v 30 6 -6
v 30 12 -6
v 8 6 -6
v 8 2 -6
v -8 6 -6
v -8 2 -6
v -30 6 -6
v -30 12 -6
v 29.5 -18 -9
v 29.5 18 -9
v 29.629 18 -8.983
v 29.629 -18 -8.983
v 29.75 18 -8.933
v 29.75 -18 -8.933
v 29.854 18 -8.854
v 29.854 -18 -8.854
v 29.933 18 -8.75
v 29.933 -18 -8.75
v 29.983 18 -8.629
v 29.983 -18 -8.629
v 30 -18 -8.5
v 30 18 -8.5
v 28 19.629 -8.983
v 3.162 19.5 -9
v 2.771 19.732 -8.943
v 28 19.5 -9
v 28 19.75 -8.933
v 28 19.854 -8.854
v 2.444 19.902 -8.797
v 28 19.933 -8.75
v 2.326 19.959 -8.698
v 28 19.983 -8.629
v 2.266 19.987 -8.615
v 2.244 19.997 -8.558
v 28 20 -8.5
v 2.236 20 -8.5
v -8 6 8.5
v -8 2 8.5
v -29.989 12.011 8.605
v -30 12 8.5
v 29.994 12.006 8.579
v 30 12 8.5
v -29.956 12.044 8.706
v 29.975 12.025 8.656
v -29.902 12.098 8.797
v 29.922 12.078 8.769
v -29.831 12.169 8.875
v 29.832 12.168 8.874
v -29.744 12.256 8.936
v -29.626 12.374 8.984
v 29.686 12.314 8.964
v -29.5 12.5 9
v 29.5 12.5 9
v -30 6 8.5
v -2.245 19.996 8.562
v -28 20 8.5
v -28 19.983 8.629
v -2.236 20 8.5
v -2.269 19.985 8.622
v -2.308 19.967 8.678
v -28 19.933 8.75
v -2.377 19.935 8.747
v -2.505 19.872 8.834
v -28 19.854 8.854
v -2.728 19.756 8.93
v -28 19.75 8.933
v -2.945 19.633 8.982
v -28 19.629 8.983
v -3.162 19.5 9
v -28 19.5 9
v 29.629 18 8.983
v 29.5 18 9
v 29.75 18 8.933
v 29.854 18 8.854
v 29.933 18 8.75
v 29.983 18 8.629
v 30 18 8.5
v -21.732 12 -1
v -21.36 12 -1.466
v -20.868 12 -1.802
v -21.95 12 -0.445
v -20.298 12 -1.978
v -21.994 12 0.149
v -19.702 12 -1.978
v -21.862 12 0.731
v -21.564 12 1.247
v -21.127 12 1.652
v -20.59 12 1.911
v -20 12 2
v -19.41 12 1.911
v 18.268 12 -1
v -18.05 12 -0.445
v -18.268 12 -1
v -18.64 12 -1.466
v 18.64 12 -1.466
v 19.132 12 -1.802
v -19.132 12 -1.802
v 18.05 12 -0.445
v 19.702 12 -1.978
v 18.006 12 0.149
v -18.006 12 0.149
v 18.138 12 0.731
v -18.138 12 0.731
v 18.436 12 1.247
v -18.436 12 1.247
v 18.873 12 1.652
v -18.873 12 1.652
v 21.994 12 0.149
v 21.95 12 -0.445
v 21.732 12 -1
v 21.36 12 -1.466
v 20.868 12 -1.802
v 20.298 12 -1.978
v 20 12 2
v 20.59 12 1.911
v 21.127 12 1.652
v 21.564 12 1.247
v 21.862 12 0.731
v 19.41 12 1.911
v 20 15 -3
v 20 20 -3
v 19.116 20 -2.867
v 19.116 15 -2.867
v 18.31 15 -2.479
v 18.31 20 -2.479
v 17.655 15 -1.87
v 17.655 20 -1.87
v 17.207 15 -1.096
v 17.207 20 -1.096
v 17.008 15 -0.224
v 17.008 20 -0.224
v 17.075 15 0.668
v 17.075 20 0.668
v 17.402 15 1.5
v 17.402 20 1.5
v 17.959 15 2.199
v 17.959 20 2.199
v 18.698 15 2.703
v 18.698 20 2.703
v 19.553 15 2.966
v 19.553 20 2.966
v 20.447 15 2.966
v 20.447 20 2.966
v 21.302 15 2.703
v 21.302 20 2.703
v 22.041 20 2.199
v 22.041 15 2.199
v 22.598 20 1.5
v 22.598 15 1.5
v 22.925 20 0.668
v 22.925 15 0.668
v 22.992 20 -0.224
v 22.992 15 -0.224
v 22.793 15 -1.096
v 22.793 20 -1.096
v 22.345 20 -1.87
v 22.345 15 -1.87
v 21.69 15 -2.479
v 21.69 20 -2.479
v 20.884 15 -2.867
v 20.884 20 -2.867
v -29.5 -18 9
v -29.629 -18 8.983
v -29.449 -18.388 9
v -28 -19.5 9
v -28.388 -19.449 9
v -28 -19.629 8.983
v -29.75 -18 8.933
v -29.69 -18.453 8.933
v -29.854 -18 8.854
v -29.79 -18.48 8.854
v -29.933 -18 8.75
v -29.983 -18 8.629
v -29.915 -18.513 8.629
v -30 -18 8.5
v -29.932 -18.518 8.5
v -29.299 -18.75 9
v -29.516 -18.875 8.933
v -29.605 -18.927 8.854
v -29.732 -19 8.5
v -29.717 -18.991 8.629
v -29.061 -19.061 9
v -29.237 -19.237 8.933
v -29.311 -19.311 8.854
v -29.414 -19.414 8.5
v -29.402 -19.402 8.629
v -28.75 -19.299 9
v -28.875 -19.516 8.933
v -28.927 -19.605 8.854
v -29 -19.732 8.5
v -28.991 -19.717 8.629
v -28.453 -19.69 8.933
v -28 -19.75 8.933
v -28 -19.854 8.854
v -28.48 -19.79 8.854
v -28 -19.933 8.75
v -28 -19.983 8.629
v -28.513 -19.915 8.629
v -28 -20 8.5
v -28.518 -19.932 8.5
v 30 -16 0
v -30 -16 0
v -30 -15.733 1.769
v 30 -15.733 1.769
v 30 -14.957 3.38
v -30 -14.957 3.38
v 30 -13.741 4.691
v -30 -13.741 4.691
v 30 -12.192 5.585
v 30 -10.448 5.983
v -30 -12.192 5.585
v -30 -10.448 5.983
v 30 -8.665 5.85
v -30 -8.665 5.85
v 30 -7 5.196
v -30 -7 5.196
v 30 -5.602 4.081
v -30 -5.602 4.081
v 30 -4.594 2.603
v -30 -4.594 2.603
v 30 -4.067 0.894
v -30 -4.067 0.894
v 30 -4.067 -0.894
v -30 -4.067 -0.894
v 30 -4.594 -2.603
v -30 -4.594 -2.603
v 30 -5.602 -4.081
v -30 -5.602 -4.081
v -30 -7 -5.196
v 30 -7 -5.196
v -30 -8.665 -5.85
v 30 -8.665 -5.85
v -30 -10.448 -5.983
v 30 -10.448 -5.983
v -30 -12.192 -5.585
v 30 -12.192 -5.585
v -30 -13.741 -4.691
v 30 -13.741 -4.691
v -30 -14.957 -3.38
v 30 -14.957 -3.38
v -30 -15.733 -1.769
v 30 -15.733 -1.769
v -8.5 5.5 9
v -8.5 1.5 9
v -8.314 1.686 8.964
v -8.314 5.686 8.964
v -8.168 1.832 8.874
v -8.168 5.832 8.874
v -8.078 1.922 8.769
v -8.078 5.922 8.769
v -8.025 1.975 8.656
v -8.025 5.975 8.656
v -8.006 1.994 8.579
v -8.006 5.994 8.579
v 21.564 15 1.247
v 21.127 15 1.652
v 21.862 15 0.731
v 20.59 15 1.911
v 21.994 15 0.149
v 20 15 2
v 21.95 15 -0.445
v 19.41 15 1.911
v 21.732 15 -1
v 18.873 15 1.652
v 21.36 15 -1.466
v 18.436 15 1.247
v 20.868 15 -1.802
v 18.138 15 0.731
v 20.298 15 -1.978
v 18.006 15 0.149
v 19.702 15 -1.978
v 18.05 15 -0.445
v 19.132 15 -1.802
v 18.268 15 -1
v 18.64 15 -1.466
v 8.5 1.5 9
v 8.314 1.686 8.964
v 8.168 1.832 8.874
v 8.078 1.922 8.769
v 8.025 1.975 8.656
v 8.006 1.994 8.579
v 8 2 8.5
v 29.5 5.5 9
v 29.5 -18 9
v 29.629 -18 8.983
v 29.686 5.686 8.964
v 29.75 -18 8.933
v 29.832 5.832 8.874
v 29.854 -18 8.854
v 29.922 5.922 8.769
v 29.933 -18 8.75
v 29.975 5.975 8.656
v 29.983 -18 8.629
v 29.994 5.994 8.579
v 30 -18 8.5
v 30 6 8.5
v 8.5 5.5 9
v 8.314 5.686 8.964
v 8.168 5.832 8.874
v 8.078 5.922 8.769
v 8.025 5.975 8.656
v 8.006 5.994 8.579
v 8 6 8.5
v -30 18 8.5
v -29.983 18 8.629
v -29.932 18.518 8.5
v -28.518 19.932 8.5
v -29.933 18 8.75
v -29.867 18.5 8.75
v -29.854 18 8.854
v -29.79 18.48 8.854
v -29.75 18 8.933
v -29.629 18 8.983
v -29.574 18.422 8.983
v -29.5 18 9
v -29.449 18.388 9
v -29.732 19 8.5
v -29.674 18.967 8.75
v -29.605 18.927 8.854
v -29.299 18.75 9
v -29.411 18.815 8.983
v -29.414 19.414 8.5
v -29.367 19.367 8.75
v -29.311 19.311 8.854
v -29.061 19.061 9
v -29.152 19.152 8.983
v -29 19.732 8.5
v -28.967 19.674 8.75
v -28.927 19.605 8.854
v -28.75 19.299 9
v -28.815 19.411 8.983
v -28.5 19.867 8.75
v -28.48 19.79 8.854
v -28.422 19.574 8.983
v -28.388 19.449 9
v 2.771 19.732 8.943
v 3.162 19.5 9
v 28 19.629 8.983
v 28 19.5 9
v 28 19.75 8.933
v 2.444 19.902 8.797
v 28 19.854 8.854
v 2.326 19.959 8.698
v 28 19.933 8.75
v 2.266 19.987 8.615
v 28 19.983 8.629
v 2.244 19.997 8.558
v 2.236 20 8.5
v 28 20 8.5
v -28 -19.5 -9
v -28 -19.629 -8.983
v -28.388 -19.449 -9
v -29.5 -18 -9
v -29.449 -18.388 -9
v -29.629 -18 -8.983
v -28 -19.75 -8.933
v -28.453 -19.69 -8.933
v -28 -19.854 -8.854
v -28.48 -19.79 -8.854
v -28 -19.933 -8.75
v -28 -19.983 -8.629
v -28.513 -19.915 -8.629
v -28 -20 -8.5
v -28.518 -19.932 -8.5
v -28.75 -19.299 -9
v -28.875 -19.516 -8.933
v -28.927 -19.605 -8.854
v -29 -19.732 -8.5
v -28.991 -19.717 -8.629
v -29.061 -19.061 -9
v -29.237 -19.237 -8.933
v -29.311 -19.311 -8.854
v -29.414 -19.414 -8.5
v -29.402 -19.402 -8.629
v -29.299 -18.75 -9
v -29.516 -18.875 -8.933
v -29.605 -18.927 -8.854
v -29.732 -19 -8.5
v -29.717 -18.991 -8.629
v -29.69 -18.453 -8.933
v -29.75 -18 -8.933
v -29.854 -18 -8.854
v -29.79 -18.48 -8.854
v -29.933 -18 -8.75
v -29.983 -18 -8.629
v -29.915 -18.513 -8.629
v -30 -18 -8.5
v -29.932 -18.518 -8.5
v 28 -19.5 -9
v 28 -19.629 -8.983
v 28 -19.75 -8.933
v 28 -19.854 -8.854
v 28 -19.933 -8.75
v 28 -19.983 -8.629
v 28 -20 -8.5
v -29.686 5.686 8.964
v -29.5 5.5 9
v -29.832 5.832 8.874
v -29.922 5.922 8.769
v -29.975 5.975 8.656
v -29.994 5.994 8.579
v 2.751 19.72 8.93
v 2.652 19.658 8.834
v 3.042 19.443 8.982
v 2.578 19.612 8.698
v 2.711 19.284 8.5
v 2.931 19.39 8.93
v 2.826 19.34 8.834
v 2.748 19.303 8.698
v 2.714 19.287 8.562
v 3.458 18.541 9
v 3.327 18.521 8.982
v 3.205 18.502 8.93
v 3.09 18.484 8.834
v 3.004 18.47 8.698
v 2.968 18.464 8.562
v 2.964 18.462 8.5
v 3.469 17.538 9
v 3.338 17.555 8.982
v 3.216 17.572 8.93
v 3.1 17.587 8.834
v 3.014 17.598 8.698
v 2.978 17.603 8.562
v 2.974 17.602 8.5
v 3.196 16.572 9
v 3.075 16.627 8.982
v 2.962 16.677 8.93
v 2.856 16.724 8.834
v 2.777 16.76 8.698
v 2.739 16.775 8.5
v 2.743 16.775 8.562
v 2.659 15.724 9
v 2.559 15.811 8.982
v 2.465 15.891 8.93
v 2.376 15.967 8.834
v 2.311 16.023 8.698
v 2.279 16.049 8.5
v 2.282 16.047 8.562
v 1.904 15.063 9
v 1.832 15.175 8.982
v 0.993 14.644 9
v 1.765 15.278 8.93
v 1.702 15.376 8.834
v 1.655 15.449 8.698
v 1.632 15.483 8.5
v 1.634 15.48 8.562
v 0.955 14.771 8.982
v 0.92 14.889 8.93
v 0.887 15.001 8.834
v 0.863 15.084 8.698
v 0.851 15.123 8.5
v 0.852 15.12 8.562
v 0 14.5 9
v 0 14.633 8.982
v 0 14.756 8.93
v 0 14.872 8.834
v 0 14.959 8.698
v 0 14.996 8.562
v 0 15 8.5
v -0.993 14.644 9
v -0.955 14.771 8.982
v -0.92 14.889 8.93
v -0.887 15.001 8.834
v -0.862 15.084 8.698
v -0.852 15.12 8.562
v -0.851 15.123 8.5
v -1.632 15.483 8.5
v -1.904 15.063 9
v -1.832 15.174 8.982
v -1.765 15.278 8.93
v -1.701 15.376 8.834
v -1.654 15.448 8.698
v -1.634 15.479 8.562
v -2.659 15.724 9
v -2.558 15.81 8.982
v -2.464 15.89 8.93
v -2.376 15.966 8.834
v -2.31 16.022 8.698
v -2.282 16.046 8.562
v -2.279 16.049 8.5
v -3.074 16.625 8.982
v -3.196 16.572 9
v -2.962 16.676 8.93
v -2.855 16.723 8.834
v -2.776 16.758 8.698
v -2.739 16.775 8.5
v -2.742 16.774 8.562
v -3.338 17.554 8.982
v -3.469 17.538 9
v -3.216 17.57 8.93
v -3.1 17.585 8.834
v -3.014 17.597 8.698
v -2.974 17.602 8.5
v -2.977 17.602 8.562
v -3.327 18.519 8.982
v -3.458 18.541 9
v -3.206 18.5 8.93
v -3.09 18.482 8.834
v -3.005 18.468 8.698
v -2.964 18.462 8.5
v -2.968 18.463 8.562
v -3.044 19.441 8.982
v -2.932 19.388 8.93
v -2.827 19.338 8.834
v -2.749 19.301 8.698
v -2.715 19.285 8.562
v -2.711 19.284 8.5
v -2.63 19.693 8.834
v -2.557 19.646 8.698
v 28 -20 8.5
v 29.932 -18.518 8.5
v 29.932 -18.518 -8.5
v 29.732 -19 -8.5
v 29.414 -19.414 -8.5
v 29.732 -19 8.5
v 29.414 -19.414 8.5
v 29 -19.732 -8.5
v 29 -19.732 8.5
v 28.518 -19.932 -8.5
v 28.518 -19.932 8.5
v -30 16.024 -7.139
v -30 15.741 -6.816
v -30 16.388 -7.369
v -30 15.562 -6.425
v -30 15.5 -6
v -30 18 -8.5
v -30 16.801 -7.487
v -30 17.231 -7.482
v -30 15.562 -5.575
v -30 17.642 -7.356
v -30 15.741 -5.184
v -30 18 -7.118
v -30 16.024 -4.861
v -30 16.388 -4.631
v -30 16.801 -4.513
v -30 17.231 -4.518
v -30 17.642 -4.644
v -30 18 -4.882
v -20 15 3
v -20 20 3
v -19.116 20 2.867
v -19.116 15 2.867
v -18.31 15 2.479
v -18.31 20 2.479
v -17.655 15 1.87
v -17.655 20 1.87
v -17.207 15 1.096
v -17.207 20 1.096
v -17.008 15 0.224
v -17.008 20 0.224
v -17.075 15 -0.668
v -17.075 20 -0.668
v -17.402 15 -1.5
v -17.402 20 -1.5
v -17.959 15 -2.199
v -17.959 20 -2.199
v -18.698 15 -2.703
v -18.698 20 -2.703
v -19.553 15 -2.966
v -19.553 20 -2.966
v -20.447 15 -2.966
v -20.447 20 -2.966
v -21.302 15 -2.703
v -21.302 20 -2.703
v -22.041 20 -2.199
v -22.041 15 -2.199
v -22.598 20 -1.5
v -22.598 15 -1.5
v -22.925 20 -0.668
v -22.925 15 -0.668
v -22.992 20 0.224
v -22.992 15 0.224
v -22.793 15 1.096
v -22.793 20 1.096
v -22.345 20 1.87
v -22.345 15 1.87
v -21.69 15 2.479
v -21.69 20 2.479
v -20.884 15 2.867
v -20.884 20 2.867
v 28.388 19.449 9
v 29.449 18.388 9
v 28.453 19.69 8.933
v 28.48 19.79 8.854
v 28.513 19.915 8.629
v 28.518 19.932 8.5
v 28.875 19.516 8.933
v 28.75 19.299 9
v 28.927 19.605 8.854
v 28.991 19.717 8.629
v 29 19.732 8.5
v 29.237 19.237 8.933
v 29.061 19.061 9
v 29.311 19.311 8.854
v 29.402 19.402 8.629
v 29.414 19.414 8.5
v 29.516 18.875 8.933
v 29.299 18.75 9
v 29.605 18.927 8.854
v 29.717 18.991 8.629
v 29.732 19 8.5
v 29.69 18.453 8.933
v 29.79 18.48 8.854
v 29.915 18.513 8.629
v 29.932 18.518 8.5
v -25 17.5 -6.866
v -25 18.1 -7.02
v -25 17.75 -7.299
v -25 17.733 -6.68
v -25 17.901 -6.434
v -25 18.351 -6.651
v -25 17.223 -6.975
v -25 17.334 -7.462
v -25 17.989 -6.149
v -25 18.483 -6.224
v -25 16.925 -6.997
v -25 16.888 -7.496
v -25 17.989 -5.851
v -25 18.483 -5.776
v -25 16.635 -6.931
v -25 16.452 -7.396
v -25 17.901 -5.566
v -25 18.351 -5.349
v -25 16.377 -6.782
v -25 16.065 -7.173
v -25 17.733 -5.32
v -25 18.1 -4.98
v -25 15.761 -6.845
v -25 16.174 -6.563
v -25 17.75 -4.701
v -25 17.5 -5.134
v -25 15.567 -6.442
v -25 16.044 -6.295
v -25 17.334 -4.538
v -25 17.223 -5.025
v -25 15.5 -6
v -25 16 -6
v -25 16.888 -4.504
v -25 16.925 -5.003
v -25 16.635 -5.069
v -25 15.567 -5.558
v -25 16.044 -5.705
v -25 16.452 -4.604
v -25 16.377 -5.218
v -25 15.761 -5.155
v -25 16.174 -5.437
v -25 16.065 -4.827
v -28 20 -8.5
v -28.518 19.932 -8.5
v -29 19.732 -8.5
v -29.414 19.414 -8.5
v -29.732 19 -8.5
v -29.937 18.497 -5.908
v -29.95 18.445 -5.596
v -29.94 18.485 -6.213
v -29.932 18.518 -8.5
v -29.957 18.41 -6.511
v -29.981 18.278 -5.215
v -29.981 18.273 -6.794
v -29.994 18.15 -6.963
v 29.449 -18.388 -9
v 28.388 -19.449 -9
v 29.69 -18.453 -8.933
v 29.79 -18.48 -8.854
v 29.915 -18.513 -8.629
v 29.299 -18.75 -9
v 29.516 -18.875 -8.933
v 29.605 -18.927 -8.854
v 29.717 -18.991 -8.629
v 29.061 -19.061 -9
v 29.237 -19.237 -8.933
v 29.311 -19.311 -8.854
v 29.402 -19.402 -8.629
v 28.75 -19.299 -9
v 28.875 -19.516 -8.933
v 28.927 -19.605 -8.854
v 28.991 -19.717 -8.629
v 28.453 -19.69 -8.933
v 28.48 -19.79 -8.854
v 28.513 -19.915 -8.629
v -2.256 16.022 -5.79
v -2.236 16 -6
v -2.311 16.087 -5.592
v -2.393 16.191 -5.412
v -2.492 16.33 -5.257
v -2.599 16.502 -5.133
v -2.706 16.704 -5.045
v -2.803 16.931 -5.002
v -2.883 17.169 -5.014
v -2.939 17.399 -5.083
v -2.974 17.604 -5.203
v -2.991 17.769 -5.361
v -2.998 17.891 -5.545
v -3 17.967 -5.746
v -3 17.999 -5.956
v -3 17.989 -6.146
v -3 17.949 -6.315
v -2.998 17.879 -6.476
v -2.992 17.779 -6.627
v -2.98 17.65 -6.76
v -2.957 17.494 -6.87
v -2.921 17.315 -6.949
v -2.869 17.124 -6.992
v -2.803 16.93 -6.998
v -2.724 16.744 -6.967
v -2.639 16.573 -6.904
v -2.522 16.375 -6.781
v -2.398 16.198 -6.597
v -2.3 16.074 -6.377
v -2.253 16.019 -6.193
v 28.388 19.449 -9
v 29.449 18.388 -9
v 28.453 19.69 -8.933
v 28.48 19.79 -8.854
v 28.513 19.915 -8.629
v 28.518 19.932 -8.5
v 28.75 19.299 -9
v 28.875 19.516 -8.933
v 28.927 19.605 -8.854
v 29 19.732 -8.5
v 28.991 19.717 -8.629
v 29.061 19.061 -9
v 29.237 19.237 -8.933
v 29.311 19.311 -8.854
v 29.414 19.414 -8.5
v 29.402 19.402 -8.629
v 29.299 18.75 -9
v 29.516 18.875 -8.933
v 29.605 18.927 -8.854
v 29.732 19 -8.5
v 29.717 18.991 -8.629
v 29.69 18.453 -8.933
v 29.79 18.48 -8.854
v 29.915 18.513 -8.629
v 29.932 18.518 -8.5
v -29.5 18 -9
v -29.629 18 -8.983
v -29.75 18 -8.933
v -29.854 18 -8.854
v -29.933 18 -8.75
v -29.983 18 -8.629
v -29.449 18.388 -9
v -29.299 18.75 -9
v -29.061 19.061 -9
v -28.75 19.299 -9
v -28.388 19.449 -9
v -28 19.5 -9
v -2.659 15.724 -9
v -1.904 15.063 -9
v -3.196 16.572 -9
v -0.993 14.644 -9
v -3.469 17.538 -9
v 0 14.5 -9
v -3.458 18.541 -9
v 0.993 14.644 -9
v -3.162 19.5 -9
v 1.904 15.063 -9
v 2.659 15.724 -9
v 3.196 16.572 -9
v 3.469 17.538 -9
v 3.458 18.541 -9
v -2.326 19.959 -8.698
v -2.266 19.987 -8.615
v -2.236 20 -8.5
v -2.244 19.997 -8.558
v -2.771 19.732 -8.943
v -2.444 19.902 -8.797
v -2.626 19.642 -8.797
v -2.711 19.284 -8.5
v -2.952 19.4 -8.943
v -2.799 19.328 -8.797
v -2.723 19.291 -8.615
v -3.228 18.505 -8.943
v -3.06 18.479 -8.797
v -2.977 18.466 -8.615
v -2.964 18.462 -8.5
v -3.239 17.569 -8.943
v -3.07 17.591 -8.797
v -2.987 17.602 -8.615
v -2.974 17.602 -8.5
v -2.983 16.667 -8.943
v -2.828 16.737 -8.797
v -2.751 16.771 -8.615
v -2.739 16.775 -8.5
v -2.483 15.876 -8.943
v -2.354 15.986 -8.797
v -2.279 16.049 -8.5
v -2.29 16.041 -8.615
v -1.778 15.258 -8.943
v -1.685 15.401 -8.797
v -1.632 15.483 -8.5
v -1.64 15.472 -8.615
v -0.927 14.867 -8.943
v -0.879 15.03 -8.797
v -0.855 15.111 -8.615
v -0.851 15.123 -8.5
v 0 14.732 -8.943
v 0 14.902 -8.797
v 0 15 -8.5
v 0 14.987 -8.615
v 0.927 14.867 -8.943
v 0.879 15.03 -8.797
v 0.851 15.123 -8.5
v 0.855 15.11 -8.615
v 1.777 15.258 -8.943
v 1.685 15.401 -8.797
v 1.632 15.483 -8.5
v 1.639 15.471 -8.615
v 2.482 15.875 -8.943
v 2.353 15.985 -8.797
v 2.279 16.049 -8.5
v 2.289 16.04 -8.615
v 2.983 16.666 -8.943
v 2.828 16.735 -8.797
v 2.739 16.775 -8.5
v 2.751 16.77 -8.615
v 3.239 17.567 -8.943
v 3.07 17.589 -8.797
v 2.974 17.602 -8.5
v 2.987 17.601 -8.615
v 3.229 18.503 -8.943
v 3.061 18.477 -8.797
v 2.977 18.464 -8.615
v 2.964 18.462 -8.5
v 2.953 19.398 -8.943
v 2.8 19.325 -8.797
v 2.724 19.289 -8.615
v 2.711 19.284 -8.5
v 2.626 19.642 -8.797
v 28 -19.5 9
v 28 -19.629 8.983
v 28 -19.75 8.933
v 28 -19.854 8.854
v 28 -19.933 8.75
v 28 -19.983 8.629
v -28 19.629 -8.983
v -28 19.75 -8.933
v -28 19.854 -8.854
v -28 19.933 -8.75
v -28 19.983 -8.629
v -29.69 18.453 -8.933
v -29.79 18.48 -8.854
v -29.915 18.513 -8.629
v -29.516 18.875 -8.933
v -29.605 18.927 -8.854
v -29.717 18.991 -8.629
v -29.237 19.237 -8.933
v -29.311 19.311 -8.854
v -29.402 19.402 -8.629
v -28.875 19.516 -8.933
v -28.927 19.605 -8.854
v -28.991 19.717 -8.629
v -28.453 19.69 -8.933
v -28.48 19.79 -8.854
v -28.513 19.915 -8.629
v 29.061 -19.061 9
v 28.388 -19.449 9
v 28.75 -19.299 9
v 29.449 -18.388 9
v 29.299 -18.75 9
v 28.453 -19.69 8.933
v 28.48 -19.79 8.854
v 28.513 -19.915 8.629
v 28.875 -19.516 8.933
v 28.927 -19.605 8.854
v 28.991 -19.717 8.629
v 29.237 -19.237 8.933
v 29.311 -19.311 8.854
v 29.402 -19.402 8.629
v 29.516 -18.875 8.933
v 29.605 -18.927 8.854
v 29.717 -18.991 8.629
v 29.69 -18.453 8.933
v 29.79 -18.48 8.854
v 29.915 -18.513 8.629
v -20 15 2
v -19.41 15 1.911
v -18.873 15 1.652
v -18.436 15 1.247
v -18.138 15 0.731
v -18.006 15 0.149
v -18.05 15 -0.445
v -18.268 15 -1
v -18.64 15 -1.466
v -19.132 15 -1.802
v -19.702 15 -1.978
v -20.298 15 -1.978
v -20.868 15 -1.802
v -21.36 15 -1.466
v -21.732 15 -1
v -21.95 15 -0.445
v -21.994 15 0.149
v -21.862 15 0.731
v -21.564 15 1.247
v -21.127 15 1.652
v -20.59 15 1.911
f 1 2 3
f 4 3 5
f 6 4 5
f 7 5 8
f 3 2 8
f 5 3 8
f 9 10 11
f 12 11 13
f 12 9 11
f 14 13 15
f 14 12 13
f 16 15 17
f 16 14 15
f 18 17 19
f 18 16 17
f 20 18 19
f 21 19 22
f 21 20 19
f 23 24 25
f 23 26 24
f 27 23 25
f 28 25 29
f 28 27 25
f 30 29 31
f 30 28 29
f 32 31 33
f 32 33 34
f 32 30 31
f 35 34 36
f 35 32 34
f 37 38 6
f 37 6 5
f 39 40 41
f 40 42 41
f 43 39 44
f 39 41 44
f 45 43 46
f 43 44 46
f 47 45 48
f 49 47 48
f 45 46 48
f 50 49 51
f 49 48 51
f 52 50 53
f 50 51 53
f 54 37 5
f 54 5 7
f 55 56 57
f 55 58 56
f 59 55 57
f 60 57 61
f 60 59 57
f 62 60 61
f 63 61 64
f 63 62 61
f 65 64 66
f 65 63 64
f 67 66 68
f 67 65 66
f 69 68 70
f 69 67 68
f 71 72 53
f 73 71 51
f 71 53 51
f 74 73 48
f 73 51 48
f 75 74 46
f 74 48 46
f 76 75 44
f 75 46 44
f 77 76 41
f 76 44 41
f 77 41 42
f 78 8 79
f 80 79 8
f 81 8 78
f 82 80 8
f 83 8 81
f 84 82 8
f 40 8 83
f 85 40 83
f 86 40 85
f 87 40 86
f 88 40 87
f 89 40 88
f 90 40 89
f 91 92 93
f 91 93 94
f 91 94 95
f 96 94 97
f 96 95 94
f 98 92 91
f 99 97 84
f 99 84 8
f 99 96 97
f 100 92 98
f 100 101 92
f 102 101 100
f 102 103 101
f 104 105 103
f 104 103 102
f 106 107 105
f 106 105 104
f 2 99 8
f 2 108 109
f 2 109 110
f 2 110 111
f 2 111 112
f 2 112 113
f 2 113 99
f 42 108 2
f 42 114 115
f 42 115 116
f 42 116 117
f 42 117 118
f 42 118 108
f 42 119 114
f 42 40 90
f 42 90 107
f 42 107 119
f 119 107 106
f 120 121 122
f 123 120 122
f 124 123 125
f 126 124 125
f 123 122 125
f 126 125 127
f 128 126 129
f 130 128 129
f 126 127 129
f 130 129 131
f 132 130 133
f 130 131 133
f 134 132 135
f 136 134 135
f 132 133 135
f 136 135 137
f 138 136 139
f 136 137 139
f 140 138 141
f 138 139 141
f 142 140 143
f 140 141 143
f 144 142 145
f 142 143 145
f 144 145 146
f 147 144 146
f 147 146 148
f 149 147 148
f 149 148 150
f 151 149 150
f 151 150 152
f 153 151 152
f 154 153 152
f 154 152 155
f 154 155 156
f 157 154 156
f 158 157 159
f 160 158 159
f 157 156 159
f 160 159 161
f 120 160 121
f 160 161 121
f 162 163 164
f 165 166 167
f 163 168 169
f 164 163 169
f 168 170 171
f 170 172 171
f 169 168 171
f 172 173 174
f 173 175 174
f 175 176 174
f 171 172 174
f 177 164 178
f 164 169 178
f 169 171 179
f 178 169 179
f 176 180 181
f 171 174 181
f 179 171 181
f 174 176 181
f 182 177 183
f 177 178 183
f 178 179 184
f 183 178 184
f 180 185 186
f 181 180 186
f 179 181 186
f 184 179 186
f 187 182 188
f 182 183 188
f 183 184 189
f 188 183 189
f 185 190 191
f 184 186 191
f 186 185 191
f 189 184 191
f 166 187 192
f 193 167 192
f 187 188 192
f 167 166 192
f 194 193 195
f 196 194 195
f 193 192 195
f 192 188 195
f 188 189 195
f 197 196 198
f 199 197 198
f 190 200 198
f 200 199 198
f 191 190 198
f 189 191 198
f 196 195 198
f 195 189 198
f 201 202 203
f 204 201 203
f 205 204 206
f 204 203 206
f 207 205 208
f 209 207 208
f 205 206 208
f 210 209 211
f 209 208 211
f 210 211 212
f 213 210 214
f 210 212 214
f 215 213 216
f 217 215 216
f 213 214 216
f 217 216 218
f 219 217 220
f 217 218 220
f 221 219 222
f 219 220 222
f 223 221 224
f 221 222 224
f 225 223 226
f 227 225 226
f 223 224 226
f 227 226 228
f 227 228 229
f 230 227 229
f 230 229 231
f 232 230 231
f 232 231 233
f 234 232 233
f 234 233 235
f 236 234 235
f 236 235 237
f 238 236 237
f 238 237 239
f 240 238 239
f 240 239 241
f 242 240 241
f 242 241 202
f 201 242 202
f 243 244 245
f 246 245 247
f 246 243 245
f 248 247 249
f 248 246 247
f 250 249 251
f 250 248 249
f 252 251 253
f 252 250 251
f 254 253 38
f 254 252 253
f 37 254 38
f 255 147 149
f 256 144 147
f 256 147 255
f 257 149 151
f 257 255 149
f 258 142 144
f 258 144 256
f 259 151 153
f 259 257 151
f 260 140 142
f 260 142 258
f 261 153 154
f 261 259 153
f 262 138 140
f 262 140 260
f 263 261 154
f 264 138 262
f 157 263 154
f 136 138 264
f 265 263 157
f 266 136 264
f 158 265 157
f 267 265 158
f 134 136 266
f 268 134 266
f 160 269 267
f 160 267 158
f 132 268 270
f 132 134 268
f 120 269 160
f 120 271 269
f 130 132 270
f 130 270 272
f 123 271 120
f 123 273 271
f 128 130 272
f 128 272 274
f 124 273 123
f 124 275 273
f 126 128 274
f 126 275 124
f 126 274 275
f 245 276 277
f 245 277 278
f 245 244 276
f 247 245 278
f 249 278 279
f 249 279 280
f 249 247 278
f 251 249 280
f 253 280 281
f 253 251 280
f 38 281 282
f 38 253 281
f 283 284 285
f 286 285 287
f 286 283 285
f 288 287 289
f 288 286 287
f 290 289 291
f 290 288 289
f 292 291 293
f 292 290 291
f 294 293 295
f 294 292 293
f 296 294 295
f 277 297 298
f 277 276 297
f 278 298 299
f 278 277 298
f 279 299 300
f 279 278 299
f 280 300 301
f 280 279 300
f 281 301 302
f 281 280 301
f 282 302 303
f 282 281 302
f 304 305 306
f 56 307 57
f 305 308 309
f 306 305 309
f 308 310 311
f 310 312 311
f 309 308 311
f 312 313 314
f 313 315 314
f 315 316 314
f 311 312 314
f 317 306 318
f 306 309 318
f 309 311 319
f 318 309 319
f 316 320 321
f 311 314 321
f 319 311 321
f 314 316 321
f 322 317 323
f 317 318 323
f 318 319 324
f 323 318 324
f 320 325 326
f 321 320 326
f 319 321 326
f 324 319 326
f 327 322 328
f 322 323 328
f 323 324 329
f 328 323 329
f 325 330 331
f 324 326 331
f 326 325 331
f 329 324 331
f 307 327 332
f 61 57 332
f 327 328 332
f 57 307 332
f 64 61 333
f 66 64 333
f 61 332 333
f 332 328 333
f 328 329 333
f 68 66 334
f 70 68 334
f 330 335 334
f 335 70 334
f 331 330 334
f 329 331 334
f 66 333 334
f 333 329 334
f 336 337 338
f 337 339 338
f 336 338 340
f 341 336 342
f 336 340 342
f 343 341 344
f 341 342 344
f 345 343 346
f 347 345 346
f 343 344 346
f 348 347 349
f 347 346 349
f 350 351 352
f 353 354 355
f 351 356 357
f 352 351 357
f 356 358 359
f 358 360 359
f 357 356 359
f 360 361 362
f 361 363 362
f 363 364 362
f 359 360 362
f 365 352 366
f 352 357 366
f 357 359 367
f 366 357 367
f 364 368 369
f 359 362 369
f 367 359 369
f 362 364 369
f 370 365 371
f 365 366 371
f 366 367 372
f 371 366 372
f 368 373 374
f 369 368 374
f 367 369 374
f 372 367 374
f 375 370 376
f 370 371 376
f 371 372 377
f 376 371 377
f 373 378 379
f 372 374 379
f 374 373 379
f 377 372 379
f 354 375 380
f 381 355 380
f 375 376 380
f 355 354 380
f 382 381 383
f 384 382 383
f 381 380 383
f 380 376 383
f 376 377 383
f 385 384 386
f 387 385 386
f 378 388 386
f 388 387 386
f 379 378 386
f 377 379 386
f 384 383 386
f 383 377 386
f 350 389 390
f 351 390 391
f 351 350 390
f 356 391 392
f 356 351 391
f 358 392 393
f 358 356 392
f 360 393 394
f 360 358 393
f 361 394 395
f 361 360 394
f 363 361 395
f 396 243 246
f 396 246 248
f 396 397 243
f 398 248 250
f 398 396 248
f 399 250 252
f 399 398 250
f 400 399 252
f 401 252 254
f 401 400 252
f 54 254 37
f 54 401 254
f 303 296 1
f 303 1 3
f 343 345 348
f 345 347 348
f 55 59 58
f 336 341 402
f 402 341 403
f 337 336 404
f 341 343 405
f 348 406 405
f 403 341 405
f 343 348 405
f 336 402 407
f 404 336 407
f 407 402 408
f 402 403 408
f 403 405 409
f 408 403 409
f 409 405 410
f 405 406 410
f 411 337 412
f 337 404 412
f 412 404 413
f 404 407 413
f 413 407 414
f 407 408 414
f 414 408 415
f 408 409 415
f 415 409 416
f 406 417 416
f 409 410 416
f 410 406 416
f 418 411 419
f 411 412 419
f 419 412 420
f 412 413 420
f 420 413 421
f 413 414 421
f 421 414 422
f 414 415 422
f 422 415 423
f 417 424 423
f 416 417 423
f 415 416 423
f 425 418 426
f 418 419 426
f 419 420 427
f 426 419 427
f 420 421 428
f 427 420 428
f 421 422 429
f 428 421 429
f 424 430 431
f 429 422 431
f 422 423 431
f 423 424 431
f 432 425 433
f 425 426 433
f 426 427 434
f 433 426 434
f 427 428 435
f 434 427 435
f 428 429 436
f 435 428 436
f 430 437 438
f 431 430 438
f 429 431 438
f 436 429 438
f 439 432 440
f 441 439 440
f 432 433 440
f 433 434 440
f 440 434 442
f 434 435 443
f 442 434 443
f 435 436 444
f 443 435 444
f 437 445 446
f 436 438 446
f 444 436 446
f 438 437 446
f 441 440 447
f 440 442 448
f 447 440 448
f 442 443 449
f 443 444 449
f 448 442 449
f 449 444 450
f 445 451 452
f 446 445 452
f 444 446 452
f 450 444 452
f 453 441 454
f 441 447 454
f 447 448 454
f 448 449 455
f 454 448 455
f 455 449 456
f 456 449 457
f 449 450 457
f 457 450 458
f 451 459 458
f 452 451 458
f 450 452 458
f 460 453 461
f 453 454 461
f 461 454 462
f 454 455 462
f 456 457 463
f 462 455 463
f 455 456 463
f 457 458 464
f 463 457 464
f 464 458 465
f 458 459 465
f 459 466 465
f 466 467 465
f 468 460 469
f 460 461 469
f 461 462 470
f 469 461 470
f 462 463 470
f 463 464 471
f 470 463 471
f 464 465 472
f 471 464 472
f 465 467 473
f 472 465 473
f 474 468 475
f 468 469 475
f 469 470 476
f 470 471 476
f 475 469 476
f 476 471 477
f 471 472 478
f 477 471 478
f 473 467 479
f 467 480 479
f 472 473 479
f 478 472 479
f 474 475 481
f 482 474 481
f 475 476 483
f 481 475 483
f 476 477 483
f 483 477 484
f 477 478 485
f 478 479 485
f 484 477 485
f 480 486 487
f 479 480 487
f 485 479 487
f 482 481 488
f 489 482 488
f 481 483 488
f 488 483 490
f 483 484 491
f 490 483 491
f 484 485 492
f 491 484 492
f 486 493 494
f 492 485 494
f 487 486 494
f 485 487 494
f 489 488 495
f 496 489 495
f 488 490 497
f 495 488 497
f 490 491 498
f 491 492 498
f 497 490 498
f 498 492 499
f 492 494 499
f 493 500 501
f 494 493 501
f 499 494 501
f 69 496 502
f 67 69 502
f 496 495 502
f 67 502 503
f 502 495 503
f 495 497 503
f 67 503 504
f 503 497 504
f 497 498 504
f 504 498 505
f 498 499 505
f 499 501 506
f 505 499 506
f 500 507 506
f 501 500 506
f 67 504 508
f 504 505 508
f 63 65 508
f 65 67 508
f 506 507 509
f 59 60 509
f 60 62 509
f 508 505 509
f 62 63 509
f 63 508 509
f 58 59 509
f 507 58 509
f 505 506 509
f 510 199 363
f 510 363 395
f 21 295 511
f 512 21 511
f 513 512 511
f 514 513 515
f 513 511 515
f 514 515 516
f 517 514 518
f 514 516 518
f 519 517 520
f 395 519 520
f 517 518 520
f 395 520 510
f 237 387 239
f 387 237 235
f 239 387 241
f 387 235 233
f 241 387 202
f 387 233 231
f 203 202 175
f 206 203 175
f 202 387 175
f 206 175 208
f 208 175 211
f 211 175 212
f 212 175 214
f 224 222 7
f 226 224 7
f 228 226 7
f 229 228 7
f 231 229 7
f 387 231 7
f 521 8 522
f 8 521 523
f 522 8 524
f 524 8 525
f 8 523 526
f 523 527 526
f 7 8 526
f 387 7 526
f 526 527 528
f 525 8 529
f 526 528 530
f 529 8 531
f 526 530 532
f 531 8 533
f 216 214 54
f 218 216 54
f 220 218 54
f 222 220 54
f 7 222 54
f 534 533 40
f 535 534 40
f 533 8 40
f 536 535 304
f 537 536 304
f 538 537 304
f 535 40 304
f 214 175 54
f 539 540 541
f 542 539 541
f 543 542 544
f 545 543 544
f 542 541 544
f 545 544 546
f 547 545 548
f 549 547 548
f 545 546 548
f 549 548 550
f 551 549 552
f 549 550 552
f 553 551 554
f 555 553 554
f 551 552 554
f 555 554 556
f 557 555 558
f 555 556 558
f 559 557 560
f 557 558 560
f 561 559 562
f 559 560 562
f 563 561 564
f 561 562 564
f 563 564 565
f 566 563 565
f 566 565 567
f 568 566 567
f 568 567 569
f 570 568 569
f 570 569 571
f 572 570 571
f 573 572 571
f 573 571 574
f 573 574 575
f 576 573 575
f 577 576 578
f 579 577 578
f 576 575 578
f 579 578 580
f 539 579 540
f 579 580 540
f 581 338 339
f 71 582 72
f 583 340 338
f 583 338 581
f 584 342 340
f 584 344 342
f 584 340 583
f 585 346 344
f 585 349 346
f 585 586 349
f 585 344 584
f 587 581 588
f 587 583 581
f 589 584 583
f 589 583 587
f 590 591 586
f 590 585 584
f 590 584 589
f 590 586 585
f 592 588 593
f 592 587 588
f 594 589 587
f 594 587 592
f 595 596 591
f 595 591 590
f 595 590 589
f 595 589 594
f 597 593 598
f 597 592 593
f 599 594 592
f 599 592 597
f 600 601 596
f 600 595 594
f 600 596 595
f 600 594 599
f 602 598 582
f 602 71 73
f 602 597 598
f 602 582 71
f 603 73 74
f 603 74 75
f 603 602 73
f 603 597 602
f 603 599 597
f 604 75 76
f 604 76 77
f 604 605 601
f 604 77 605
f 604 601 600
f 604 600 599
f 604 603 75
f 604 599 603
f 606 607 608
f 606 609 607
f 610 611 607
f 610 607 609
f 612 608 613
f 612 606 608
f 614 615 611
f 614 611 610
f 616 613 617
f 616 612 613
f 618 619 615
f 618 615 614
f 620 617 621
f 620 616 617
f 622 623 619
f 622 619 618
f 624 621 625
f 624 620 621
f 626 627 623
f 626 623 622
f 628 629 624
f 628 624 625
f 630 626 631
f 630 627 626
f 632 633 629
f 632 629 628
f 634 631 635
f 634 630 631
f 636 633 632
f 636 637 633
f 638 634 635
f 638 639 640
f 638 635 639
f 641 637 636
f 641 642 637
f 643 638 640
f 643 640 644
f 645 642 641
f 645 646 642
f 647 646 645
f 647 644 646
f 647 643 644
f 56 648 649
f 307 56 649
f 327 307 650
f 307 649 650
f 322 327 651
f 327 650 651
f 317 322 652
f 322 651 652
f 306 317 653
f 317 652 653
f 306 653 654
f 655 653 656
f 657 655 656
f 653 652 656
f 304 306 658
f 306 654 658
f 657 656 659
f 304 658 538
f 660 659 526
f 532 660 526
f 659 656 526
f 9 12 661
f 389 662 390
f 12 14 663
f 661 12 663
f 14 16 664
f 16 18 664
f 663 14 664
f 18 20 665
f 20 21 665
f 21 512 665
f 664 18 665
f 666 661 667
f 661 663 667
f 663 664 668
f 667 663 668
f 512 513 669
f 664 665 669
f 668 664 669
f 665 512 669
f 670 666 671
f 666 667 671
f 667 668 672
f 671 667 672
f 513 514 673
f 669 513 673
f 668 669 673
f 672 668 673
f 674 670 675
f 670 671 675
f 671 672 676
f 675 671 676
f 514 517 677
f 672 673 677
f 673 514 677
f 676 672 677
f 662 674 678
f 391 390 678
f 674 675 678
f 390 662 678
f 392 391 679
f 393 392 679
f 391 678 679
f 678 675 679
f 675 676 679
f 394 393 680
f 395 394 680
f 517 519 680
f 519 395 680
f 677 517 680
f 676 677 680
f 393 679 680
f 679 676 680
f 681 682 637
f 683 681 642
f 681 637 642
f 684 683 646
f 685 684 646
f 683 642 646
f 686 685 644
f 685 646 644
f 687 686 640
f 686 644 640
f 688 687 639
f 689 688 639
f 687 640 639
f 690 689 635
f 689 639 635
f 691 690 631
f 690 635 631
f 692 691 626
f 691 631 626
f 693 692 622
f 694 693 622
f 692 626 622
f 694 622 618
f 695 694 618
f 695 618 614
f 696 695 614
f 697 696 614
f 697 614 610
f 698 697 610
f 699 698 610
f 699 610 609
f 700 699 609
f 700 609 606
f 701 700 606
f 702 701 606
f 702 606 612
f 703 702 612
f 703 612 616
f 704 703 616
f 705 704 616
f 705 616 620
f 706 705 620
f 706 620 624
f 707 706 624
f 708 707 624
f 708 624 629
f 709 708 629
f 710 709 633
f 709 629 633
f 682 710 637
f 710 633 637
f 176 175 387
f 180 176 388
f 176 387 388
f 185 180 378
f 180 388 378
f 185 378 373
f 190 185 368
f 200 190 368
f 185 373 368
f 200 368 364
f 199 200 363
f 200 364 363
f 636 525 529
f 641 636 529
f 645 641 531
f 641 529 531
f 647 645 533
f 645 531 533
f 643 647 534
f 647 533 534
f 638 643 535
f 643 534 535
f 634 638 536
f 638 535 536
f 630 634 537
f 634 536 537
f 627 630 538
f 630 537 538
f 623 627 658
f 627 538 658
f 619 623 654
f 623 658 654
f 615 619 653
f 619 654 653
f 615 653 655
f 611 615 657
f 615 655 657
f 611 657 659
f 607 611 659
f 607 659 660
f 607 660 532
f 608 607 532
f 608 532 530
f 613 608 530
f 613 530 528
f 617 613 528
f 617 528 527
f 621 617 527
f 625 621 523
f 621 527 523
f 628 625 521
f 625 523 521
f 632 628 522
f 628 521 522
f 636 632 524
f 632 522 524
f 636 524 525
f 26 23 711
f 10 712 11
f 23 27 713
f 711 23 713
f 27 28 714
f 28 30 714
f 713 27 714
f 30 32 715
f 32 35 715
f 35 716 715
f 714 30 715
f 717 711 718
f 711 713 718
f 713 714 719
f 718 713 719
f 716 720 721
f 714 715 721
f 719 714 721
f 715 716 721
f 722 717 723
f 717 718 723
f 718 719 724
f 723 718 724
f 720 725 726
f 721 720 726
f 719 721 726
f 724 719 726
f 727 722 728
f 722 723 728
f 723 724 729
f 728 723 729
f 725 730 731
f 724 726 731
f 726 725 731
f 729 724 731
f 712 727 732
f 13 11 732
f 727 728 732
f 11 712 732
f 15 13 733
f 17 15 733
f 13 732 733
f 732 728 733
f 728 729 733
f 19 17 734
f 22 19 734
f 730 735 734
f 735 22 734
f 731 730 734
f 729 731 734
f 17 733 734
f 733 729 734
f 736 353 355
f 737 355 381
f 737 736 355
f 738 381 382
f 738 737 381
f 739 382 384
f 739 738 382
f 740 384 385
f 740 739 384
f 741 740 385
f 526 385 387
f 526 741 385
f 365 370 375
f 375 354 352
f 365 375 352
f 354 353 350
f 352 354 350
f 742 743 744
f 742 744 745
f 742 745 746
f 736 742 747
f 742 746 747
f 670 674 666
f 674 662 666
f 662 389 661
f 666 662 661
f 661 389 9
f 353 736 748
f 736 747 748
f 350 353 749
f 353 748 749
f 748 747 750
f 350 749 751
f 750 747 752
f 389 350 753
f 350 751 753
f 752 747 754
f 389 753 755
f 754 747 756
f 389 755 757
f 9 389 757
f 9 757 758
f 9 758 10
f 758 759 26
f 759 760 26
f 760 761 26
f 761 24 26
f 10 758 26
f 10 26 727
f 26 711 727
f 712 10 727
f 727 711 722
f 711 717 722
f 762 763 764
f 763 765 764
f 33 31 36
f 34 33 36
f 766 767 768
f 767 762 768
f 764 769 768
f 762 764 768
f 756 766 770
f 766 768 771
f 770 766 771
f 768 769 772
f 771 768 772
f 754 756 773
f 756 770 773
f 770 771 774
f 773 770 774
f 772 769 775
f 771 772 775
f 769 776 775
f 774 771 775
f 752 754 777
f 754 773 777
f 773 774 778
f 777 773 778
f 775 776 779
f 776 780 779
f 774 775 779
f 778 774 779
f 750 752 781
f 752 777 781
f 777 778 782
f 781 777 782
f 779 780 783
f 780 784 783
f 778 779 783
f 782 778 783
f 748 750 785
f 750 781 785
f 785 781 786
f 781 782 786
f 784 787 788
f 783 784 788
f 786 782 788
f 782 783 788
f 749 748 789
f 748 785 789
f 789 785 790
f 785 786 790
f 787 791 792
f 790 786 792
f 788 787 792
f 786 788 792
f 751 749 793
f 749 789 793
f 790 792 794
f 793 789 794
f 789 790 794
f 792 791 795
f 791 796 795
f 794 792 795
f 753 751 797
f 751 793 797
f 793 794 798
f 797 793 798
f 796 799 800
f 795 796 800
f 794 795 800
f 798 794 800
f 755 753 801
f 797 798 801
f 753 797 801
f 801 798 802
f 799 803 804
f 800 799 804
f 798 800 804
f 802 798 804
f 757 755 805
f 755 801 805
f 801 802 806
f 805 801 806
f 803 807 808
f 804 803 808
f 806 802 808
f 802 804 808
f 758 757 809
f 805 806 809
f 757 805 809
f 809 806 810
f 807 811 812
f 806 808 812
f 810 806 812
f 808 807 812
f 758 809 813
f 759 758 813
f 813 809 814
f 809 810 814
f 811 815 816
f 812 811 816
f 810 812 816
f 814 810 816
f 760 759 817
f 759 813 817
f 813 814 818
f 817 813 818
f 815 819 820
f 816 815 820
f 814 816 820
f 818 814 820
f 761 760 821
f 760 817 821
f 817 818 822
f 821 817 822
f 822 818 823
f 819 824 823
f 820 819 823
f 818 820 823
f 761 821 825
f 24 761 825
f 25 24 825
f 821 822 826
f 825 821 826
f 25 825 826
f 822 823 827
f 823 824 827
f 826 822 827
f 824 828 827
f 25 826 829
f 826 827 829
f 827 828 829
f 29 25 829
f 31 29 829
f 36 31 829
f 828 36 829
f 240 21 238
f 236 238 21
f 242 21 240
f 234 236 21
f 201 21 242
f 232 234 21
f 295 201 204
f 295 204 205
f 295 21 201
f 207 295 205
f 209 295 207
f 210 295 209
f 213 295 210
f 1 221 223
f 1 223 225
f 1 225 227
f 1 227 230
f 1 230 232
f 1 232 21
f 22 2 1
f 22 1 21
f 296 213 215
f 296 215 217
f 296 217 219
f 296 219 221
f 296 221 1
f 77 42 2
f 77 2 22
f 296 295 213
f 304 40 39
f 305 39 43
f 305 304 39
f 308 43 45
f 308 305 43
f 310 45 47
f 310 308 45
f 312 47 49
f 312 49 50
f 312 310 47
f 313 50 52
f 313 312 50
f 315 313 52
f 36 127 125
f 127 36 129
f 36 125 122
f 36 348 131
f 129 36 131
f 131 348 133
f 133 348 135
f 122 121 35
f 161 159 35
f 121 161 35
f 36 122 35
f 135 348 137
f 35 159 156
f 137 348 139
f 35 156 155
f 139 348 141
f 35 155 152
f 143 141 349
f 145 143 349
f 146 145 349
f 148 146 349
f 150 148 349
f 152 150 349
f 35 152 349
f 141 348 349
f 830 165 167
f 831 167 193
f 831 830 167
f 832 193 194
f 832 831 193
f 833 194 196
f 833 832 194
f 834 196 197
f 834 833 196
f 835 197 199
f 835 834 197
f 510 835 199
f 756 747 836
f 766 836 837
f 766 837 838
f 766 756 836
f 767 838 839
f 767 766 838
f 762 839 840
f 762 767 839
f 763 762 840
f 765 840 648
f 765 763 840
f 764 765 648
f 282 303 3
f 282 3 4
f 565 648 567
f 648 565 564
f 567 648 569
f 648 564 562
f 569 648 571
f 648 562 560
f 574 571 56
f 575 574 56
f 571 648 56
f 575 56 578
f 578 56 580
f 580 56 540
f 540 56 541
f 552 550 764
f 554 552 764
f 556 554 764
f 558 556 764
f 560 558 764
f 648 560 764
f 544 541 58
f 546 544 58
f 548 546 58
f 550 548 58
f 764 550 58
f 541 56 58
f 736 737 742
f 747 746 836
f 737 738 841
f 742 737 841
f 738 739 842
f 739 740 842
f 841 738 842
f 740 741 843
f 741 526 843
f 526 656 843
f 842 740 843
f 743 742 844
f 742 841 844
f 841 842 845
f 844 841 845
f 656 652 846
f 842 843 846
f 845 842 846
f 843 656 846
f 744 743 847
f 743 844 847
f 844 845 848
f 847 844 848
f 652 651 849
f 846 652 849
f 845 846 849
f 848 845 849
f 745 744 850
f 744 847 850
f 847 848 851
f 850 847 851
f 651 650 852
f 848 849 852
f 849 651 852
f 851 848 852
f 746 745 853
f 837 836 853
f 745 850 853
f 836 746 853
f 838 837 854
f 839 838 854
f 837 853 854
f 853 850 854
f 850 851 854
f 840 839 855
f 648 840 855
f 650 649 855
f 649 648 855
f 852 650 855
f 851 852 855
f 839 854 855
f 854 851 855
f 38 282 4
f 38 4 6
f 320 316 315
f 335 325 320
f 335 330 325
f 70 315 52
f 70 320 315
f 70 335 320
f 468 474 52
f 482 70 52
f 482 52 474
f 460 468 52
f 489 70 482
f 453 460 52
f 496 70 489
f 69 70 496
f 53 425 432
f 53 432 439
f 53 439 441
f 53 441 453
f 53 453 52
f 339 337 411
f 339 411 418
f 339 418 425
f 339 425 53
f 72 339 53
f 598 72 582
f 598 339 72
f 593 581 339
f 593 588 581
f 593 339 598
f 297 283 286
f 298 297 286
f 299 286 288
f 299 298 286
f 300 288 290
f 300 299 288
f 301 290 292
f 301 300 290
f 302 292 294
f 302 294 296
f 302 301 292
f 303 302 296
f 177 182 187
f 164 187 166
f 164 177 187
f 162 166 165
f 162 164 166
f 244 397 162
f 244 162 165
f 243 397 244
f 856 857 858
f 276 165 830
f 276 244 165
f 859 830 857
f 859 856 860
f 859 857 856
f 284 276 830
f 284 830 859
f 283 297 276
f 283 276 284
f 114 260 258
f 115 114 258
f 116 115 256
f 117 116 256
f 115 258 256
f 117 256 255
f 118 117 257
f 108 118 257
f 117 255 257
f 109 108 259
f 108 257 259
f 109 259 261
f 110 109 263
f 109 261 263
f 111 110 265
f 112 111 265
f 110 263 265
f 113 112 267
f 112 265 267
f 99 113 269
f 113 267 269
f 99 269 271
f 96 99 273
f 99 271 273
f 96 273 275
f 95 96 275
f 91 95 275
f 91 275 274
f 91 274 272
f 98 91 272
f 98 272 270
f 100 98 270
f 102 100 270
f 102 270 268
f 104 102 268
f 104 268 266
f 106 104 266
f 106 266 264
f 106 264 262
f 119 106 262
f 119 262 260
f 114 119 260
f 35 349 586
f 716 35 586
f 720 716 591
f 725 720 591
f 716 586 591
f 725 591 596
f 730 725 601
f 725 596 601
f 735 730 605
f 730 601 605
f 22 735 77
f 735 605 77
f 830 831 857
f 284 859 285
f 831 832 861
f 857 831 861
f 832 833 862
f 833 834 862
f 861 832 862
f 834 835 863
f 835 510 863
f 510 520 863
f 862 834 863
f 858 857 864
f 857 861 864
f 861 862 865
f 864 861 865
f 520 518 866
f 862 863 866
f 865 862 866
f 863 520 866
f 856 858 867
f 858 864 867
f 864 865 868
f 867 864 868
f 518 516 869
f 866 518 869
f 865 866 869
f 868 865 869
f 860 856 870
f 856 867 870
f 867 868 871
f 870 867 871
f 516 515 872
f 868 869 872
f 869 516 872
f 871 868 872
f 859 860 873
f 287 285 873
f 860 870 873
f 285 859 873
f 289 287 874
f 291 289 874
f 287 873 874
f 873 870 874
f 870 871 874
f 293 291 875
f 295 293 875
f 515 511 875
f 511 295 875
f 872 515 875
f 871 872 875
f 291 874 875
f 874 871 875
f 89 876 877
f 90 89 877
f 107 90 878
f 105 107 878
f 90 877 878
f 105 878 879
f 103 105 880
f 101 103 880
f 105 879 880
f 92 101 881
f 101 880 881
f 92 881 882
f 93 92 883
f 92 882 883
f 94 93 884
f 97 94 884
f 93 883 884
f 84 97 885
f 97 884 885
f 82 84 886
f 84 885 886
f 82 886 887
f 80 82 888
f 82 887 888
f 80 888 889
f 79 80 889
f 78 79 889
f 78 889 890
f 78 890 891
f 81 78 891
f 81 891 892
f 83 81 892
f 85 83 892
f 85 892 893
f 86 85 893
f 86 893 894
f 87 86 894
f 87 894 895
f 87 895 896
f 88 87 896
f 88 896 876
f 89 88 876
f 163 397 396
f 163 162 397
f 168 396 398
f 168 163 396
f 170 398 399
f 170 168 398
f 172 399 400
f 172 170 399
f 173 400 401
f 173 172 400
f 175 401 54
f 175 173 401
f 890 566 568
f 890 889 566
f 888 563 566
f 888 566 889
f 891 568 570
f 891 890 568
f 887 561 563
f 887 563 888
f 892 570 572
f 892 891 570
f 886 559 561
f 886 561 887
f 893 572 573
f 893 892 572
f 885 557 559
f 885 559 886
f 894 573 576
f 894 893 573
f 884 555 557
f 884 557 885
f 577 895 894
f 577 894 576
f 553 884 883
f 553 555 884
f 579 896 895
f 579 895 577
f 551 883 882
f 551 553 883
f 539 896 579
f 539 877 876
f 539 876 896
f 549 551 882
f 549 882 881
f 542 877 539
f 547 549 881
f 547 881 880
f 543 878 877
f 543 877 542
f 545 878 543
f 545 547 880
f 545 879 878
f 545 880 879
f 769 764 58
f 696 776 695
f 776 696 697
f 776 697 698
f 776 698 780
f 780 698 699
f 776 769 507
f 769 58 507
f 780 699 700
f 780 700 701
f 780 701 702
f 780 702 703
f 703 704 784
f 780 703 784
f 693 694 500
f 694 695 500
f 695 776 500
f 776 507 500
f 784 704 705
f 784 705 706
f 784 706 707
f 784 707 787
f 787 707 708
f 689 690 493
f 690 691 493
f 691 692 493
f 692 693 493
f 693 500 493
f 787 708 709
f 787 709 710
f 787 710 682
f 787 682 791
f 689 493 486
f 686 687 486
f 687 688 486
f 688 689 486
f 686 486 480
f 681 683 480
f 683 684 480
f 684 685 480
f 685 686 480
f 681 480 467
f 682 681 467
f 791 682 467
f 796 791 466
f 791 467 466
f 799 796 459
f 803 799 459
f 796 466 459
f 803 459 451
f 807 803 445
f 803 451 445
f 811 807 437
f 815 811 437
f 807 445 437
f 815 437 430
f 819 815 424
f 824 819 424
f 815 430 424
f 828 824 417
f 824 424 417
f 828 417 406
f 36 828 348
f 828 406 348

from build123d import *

# Parameters (mm, degrees)
SKETCH1_W           = 60
SKETCH1_H           = 40
BOSS_EXTRUDE1_DEPTH = 9
SKETCH2_R           = 6
CUT_EXTRUDE1_DEPTH  = 64.882705015
SKETCH3_R           = 3
CUT_EXTRUDE2_DEPTH  = 41.298883359
CUT_EXTRUDE3_DEPTH  = 15
SKETCH5_R           = 1
CUT_EXTRUDE4_DEPTH  = 29
SKETCH6_R           = 1.5
CUT_EXTRUDE5_DEPTH  = 5
CUT_EXTRUDE6_REACH  = 52.804
SKETCH7_R           = 2
SKETCH8_R           = 3
CUT_EXTRUDE7_DEPTH  = 5
FILLET1_R           = 2
FILLET2_R           = 0.5


with BuildPart() as part:
    # Sketch1 → Boss-Extrude1 (new, symmetric)
    with BuildSketch(Plane.XY):
        Rectangle(SKETCH1_W, SKETCH1_H)
    extrude(amount=BOSS_EXTRUDE1_DEPTH, both=True)

    # Sketch2 → Cut-Extrude1 (cut, through all)
    with BuildSketch(Plane.ZY.offset(30)):
        with Locations(Location((0, -10, 0), (0, 0, 270))):
            Circle(SKETCH2_R)
    extrude(amount=-CUT_EXTRUDE1_DEPTH, mode=Mode.SUBTRACT)

    # Sketch3 → Cut-Extrude2 (cut, through all)
    with BuildSketch(Plane.XY.offset(9)):
        with Locations((0, 18)):
            Circle(SKETCH3_R)
    extrude(amount=-CUT_EXTRUDE2_DEPTH, mode=Mode.SUBTRACT)

    # Sketch4 → Cut-Extrude3 (cut)
    with BuildSketch(Plane.XY.offset(9)):
        Polygon((-30, 12), (30, 12), (30, 6), (8, 6), (8, 2), (-8, 2), (-8, 6), (-30, 6), align=None)
    extrude(amount=-CUT_EXTRUDE3_DEPTH, mode=Mode.SUBTRACT)

    # Sketch5 → Cut-Extrude4 (cut)
    with BuildSketch(Plane.ZY.offset(30)):
        with Locations(Location((-6, 17, 0), (0, 0, 270))):
            Circle(SKETCH5_R)
    extrude(amount=-CUT_EXTRUDE4_DEPTH, mode=Mode.SUBTRACT)

    # Sketch6 → Cut-Extrude5 (cut)
    with BuildSketch(Plane.ZY.offset(30)):
        with Locations(Location((-6, 17, 0), (0, 0, 270))):
            Circle(SKETCH6_R)
    extrude(amount=-CUT_EXTRUDE5_DEPTH, mode=Mode.SUBTRACT)

    # Sketch7 → Cut-Extrude6 (cut, up to next)
    with BuildSketch(Plane(origin=(0, 20, 0), x_dir=(1, 0, 0), z_dir=(0, 1, 0)), mode=Mode.PRIVATE) as cut_extrude6_sk1:
        with Locations(Location((-20, 0, 0), (0, 0, 270))):
            Circle(SKETCH7_R)
    cut_extrude6_tool1 = extrude(cut_extrude6_sk1.sketch, amount=-CUT_EXTRUDE6_REACH, mode=Mode.PRIVATE) & part.part
    # Sketch7 → Cut-Extrude6 (cut, up to next)
    with BuildSketch(Plane(origin=(0, 20, 0), x_dir=(1, 0, 0), z_dir=(0, 1, 0)), mode=Mode.PRIVATE) as cut_extrude6_sk2:
        with Locations(Location((20, 0, 0), (0, 0, 270))):
            Circle(SKETCH7_R)
    cut_extrude6_tool2 = extrude(cut_extrude6_sk2.sketch, amount=-CUT_EXTRUDE6_REACH, mode=Mode.PRIVATE) & part.part
    add(cut_extrude6_tool1.solids().sort_by_distance((-20, 20, 0))[0], mode=Mode.SUBTRACT)
    add(cut_extrude6_tool2.solids().sort_by_distance((20, 20, 0))[0], mode=Mode.SUBTRACT)

    # Sketch8 → Cut-Extrude7 (cut)
    with BuildSketch(Plane(origin=(0, 20, 0), x_dir=(1, 0, 0), z_dir=(0, 1, 0))):
        with Locations(Location((-20, 0, 0), (0, 0, 270))):
            Circle(SKETCH8_R)
        with Locations(Location((20, 0, 0), (0, 0, 90))):
            Circle(SKETCH8_R)
    extrude(amount=-CUT_EXTRUDE7_DEPTH, mode=Mode.SUBTRACT)

    # Fillet1
    # the kernel refuses this fillet: 2 mm, written as the material it takes off along each edge
    with BuildSketch(Plane(origin=(30, -20, 14), x_dir=(-1, 0, 0), z_dir=(0, 0, -1))) as fillet1_piece_1:
        with BuildLine():
            CenterArc((FILLET1_R, FILLET1_R), FILLET1_R, 180, 90)
            Line((0, FILLET1_R), (0, 0))
            Line((0, 0), (FILLET1_R, 0))
        make_face()
    extrude(amount=28, mode=Mode.SUBTRACT)
    with BuildSketch(Plane(origin=(-30, -20, -14), x_dir=(0, 1, 0), z_dir=(0, 0, 1)), Plane(origin=(-30, 20, -14), x_dir=(1, 0, 0), z_dir=(0, 0, 1)), Plane(origin=(30, 20, 14), x_dir=(-1, 0, 0), z_dir=(0, 0, -1))) as fillet1_piece_2:
        with BuildLine():
            CenterArc((FILLET1_R, -FILLET1_R), FILLET1_R, 90, 90)
            Line((0, -FILLET1_R), (0, 0))
            Line((0, 0), (FILLET1_R, 0))
        make_face()
    extrude(amount=28, mode=Mode.SUBTRACT)

    # Fillet2
    fillet2_edges = [part.edges().sort_by_distance(p)[0] for p in [
        (29.414213562, -19.414213562, 9),
        (15.118033989, 20, 9),
        (-30, 15, 9),
        (-29.414213562, 19.414213562, 9),
        (29.414213562, 19.414213562, 9),
        (-15.118033989, 20, -9),
        (0, 15, -9),
        (-15.118033989, 20, 9),
        (0, 15, 9),
        (-30, -6, 9),
        (30, 15, 9),
        (-19, 6, 9),
        (-8, 4, 9),
        (0, 2, 9),
        (8, 4, 9),
        (19, 6, 9),
        (0, 12, 9),
        (30, -6, 9),
        (30, 0, -9),
        (15.118033989, 20, -9),
        (0, -20, -9),
        (-30, 0, -9),
        (-29.414213562, 19.414213562, -9),
        (-29.414213562, -19.414213562, -9),
        (29.414213562, 19.414213562, -9),
        (29.414213562, -19.414213562, -9),
        (0, -20, 9),
        (-29.414213562, -19.414213562, 9),
    ]]
    fillet(fillet2_edges, radius=FILLET2_R)


solid = part.part
